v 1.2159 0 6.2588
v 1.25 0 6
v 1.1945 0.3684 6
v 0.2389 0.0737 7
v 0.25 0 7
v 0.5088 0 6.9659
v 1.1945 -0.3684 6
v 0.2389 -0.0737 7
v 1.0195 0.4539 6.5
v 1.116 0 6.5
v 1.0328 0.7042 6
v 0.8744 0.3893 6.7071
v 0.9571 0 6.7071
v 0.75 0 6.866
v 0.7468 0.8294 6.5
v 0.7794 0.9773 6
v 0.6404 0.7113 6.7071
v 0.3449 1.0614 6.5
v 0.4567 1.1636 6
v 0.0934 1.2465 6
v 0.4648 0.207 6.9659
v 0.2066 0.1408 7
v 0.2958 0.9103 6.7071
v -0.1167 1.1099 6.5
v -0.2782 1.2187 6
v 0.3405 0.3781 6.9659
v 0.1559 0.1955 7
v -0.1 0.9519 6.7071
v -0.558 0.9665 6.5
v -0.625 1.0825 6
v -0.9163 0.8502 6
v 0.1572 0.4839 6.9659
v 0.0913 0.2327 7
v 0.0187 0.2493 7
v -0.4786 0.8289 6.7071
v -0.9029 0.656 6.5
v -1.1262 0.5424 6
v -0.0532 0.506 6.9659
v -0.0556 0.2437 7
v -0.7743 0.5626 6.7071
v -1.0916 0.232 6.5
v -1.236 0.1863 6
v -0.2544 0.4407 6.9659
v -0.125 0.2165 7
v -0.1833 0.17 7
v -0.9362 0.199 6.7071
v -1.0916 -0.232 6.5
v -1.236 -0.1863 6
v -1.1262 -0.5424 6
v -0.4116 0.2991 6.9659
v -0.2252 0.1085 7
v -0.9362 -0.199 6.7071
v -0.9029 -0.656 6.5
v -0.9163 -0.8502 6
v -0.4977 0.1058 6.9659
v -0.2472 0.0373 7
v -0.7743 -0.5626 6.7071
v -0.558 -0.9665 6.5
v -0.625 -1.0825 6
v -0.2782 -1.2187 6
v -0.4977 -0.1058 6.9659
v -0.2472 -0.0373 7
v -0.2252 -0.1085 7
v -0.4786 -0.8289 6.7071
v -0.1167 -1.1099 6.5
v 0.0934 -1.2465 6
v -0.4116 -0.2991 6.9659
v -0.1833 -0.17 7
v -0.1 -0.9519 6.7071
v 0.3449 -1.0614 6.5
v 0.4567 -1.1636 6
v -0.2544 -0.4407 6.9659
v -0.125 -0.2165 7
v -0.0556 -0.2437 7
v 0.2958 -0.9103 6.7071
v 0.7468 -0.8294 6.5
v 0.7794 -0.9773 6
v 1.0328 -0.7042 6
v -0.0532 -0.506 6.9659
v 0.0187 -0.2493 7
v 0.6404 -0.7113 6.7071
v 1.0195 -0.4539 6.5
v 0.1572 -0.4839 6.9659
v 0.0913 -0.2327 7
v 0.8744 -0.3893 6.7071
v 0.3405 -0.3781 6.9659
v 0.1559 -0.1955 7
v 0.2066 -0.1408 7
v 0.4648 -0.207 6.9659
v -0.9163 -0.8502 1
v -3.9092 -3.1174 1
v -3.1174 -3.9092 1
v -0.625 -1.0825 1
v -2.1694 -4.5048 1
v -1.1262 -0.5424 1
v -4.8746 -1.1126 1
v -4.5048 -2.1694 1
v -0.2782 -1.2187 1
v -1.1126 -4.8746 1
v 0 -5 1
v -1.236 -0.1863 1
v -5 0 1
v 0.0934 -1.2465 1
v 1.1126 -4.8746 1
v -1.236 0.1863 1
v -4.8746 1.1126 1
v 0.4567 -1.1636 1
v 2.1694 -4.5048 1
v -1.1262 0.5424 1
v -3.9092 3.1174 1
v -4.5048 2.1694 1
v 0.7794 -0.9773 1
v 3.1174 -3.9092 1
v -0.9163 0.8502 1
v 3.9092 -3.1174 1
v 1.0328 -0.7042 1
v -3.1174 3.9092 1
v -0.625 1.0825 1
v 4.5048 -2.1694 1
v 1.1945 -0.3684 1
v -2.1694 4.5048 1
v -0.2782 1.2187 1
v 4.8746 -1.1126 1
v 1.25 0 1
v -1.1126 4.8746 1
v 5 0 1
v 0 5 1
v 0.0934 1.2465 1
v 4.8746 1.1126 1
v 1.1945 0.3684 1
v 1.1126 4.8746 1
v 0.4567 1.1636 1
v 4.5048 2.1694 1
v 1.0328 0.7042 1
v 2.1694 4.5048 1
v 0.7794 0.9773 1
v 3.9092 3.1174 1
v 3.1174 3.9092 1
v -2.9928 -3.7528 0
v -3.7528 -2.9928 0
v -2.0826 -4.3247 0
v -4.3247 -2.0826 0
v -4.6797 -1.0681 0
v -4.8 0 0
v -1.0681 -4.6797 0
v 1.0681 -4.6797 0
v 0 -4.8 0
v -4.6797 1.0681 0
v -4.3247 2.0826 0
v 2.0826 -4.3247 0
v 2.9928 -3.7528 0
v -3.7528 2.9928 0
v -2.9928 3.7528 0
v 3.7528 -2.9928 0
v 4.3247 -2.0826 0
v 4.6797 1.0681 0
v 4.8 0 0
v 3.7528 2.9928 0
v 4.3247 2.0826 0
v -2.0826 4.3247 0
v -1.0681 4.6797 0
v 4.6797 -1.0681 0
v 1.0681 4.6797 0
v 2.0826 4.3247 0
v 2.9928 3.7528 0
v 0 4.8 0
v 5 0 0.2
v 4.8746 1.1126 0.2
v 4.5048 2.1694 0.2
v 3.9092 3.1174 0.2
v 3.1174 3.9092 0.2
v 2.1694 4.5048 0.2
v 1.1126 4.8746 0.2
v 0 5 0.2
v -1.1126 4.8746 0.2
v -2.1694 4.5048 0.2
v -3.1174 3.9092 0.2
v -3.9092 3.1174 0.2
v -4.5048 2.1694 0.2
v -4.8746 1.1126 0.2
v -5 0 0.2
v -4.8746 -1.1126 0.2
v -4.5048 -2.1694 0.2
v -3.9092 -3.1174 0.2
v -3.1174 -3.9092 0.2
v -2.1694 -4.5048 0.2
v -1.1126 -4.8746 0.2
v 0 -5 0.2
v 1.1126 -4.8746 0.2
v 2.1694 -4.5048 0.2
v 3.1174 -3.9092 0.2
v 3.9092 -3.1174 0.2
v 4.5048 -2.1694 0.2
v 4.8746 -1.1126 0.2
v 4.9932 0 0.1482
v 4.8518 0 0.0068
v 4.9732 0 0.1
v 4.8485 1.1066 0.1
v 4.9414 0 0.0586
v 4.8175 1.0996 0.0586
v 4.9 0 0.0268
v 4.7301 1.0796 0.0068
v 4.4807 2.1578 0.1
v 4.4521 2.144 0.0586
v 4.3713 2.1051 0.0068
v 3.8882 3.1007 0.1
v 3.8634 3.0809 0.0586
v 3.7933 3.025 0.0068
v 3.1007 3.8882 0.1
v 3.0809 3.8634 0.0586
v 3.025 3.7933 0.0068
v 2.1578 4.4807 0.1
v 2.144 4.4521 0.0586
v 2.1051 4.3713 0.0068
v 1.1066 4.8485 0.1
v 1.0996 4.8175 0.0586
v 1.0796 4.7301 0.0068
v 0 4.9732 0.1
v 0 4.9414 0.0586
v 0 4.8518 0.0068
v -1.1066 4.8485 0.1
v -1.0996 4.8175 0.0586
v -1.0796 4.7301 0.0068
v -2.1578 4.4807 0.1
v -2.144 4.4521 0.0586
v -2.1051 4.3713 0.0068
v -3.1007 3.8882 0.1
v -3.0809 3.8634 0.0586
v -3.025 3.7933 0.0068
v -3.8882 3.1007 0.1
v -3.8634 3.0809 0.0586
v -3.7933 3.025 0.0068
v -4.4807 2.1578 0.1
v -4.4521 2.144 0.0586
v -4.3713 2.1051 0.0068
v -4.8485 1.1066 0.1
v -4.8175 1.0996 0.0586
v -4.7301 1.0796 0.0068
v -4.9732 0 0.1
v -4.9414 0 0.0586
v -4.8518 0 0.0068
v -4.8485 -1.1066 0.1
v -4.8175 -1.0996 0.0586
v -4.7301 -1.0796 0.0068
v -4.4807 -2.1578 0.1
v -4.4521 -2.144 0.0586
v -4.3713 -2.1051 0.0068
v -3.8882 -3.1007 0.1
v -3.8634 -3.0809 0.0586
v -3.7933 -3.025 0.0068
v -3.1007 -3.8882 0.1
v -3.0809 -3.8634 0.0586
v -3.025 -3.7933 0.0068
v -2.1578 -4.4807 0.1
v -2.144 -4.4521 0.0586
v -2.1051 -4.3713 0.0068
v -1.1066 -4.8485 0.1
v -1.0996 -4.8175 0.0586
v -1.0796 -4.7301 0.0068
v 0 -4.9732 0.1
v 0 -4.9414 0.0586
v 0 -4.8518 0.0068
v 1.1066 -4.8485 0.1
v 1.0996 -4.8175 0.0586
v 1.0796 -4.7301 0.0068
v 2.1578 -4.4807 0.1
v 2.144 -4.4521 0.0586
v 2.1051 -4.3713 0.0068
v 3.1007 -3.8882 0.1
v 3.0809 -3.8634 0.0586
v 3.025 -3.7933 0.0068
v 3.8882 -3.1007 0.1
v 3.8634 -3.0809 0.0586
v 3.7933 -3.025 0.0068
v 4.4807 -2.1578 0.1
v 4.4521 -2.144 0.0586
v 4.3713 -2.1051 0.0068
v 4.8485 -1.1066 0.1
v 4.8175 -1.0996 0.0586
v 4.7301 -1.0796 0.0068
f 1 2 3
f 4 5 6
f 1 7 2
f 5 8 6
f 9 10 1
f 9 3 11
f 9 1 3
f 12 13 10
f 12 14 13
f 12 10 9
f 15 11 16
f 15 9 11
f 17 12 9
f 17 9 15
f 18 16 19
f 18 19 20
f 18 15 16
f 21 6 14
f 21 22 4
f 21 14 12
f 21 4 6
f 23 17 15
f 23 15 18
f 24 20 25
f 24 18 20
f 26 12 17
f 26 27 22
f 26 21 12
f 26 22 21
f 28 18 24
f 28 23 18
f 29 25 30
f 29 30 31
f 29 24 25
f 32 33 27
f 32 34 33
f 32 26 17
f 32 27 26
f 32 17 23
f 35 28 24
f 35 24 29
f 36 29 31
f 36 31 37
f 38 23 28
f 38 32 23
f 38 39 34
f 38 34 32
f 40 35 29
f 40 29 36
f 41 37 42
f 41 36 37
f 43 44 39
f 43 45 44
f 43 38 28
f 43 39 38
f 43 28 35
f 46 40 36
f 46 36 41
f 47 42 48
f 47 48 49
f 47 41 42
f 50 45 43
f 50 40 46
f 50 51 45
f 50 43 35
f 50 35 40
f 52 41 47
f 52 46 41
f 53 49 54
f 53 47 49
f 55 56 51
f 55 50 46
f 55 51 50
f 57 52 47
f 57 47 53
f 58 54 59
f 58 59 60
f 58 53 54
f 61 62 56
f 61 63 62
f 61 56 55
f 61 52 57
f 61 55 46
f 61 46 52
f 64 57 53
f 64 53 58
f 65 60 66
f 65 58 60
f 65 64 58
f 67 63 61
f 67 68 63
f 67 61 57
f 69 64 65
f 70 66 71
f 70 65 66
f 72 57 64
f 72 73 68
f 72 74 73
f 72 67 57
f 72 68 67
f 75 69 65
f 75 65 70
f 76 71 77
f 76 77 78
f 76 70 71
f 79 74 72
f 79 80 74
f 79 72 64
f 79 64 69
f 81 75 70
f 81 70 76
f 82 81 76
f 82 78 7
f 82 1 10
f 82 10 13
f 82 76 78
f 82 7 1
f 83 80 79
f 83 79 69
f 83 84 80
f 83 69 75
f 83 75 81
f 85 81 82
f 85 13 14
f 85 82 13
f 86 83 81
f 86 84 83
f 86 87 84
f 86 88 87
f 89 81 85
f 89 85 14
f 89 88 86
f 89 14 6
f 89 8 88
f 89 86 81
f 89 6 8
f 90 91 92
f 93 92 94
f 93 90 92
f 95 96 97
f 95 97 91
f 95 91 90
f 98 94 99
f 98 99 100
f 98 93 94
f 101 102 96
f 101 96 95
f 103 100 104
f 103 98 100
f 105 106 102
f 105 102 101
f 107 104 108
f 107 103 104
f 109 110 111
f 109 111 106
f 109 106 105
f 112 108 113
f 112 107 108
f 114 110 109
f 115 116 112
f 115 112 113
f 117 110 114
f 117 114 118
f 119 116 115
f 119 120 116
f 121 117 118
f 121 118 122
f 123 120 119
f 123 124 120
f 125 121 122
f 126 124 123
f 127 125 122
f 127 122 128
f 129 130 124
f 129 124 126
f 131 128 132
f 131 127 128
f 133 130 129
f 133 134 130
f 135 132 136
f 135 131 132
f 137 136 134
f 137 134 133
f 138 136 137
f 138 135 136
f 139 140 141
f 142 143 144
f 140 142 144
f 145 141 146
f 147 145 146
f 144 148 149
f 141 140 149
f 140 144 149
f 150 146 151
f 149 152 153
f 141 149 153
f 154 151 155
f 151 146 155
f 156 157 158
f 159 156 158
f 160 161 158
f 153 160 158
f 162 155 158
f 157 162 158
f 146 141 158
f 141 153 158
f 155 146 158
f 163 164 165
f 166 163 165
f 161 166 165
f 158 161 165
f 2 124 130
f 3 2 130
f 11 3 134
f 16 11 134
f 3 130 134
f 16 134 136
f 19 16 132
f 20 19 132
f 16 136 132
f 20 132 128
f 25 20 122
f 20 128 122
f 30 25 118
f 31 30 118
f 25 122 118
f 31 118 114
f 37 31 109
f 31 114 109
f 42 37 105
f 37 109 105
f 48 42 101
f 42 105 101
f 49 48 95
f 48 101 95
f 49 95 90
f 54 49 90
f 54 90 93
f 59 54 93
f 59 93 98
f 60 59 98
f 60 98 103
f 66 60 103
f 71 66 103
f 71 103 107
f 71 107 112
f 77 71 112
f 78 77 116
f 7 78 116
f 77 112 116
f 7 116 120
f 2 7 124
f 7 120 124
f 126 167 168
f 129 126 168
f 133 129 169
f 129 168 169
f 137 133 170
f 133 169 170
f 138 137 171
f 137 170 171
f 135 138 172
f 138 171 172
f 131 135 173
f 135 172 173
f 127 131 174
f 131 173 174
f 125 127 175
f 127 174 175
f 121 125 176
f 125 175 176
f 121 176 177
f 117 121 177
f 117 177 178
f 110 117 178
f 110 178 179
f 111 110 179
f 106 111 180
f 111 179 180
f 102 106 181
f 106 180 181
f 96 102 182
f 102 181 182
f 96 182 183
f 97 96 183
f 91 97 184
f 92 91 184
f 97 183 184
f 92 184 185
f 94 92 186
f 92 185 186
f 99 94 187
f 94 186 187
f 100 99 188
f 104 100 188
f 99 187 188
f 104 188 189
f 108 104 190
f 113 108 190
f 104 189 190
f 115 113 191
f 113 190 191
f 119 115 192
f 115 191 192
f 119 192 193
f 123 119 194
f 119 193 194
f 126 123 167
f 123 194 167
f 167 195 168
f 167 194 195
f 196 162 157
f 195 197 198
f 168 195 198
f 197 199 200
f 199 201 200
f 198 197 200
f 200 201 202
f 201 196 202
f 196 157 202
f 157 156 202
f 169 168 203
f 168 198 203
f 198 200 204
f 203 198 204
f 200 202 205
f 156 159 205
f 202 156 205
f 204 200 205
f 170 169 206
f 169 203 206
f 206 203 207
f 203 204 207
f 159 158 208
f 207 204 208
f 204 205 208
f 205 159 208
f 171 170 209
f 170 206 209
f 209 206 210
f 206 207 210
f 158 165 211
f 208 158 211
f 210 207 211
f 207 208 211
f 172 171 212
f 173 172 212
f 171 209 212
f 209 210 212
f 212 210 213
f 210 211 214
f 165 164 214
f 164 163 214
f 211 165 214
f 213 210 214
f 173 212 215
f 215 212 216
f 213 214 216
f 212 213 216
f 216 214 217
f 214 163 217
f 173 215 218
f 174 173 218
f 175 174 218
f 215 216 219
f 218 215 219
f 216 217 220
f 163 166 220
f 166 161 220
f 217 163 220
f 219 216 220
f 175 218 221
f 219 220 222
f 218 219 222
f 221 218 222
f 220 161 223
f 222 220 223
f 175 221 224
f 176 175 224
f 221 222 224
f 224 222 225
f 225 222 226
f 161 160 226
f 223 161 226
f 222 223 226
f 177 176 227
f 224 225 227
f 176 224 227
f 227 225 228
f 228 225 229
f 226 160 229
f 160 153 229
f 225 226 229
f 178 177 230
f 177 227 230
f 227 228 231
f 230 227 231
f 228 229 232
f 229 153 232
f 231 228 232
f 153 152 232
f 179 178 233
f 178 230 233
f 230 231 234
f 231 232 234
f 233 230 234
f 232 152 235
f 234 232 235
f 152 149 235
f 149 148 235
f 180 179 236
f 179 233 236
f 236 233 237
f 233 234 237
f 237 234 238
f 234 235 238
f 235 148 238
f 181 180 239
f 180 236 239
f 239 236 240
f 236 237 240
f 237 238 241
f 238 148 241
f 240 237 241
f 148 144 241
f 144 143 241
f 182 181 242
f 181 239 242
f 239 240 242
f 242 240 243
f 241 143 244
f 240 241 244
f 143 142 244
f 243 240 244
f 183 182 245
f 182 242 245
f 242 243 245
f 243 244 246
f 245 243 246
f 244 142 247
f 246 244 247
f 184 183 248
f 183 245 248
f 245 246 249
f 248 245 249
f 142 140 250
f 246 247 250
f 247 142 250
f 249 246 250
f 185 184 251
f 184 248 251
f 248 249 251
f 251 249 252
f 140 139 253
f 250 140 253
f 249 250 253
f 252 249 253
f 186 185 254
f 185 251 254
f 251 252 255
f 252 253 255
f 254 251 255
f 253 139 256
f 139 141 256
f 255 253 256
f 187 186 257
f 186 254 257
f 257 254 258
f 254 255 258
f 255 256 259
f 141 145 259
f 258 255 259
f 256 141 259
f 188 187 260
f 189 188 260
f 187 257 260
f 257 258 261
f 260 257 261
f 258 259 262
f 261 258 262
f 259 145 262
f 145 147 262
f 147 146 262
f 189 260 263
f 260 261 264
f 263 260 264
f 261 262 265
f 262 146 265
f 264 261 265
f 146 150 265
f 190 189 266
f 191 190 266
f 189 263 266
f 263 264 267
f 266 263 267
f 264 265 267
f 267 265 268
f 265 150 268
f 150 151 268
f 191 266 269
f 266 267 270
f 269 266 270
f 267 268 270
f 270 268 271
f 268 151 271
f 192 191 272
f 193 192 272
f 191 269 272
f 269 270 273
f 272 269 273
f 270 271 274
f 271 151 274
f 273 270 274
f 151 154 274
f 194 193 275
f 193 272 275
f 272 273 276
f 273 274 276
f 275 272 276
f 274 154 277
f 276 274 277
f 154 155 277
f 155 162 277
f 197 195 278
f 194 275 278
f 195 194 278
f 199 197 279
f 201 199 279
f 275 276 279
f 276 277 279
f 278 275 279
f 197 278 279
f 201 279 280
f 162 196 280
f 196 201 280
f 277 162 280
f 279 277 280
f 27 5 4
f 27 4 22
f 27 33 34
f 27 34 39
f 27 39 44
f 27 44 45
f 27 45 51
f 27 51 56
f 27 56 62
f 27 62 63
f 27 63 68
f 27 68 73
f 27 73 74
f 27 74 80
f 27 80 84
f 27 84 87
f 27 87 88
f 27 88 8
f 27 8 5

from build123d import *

# Parameters (mm, degrees)
F0_R     = 5
F1_DEPTH = 1
F2_R     = 1.25
F3_DEPTH = 6
F4_R     = 1
F5_R     = 0.2


with BuildPart() as f1:
    # F0 (on Top) → F1 (new body)
    with BuildSketch(Plane.XY):
        Circle(F0_R)
    extrude(amount=F1_DEPTH)

    # F2 (on face) → F3 (join)
    with BuildSketch(Plane.XY.offset(1)):
        Circle(F2_R)
    extrude(amount=F3_DEPTH)

    # F4
    f4_edges = [f1.edges().sort_by_distance(p)[0] for p in [
        (-1.25, 0, 7),
    ]]
    fillet(f4_edges, radius=F4_R)

    # F5
    f5_edges = [f1.edges().sort_by_distance(p)[0] for p in [
        (-5, 0, 0),
    ]]
    fillet(f5_edges, radius=F5_R)


solid = f1.part
